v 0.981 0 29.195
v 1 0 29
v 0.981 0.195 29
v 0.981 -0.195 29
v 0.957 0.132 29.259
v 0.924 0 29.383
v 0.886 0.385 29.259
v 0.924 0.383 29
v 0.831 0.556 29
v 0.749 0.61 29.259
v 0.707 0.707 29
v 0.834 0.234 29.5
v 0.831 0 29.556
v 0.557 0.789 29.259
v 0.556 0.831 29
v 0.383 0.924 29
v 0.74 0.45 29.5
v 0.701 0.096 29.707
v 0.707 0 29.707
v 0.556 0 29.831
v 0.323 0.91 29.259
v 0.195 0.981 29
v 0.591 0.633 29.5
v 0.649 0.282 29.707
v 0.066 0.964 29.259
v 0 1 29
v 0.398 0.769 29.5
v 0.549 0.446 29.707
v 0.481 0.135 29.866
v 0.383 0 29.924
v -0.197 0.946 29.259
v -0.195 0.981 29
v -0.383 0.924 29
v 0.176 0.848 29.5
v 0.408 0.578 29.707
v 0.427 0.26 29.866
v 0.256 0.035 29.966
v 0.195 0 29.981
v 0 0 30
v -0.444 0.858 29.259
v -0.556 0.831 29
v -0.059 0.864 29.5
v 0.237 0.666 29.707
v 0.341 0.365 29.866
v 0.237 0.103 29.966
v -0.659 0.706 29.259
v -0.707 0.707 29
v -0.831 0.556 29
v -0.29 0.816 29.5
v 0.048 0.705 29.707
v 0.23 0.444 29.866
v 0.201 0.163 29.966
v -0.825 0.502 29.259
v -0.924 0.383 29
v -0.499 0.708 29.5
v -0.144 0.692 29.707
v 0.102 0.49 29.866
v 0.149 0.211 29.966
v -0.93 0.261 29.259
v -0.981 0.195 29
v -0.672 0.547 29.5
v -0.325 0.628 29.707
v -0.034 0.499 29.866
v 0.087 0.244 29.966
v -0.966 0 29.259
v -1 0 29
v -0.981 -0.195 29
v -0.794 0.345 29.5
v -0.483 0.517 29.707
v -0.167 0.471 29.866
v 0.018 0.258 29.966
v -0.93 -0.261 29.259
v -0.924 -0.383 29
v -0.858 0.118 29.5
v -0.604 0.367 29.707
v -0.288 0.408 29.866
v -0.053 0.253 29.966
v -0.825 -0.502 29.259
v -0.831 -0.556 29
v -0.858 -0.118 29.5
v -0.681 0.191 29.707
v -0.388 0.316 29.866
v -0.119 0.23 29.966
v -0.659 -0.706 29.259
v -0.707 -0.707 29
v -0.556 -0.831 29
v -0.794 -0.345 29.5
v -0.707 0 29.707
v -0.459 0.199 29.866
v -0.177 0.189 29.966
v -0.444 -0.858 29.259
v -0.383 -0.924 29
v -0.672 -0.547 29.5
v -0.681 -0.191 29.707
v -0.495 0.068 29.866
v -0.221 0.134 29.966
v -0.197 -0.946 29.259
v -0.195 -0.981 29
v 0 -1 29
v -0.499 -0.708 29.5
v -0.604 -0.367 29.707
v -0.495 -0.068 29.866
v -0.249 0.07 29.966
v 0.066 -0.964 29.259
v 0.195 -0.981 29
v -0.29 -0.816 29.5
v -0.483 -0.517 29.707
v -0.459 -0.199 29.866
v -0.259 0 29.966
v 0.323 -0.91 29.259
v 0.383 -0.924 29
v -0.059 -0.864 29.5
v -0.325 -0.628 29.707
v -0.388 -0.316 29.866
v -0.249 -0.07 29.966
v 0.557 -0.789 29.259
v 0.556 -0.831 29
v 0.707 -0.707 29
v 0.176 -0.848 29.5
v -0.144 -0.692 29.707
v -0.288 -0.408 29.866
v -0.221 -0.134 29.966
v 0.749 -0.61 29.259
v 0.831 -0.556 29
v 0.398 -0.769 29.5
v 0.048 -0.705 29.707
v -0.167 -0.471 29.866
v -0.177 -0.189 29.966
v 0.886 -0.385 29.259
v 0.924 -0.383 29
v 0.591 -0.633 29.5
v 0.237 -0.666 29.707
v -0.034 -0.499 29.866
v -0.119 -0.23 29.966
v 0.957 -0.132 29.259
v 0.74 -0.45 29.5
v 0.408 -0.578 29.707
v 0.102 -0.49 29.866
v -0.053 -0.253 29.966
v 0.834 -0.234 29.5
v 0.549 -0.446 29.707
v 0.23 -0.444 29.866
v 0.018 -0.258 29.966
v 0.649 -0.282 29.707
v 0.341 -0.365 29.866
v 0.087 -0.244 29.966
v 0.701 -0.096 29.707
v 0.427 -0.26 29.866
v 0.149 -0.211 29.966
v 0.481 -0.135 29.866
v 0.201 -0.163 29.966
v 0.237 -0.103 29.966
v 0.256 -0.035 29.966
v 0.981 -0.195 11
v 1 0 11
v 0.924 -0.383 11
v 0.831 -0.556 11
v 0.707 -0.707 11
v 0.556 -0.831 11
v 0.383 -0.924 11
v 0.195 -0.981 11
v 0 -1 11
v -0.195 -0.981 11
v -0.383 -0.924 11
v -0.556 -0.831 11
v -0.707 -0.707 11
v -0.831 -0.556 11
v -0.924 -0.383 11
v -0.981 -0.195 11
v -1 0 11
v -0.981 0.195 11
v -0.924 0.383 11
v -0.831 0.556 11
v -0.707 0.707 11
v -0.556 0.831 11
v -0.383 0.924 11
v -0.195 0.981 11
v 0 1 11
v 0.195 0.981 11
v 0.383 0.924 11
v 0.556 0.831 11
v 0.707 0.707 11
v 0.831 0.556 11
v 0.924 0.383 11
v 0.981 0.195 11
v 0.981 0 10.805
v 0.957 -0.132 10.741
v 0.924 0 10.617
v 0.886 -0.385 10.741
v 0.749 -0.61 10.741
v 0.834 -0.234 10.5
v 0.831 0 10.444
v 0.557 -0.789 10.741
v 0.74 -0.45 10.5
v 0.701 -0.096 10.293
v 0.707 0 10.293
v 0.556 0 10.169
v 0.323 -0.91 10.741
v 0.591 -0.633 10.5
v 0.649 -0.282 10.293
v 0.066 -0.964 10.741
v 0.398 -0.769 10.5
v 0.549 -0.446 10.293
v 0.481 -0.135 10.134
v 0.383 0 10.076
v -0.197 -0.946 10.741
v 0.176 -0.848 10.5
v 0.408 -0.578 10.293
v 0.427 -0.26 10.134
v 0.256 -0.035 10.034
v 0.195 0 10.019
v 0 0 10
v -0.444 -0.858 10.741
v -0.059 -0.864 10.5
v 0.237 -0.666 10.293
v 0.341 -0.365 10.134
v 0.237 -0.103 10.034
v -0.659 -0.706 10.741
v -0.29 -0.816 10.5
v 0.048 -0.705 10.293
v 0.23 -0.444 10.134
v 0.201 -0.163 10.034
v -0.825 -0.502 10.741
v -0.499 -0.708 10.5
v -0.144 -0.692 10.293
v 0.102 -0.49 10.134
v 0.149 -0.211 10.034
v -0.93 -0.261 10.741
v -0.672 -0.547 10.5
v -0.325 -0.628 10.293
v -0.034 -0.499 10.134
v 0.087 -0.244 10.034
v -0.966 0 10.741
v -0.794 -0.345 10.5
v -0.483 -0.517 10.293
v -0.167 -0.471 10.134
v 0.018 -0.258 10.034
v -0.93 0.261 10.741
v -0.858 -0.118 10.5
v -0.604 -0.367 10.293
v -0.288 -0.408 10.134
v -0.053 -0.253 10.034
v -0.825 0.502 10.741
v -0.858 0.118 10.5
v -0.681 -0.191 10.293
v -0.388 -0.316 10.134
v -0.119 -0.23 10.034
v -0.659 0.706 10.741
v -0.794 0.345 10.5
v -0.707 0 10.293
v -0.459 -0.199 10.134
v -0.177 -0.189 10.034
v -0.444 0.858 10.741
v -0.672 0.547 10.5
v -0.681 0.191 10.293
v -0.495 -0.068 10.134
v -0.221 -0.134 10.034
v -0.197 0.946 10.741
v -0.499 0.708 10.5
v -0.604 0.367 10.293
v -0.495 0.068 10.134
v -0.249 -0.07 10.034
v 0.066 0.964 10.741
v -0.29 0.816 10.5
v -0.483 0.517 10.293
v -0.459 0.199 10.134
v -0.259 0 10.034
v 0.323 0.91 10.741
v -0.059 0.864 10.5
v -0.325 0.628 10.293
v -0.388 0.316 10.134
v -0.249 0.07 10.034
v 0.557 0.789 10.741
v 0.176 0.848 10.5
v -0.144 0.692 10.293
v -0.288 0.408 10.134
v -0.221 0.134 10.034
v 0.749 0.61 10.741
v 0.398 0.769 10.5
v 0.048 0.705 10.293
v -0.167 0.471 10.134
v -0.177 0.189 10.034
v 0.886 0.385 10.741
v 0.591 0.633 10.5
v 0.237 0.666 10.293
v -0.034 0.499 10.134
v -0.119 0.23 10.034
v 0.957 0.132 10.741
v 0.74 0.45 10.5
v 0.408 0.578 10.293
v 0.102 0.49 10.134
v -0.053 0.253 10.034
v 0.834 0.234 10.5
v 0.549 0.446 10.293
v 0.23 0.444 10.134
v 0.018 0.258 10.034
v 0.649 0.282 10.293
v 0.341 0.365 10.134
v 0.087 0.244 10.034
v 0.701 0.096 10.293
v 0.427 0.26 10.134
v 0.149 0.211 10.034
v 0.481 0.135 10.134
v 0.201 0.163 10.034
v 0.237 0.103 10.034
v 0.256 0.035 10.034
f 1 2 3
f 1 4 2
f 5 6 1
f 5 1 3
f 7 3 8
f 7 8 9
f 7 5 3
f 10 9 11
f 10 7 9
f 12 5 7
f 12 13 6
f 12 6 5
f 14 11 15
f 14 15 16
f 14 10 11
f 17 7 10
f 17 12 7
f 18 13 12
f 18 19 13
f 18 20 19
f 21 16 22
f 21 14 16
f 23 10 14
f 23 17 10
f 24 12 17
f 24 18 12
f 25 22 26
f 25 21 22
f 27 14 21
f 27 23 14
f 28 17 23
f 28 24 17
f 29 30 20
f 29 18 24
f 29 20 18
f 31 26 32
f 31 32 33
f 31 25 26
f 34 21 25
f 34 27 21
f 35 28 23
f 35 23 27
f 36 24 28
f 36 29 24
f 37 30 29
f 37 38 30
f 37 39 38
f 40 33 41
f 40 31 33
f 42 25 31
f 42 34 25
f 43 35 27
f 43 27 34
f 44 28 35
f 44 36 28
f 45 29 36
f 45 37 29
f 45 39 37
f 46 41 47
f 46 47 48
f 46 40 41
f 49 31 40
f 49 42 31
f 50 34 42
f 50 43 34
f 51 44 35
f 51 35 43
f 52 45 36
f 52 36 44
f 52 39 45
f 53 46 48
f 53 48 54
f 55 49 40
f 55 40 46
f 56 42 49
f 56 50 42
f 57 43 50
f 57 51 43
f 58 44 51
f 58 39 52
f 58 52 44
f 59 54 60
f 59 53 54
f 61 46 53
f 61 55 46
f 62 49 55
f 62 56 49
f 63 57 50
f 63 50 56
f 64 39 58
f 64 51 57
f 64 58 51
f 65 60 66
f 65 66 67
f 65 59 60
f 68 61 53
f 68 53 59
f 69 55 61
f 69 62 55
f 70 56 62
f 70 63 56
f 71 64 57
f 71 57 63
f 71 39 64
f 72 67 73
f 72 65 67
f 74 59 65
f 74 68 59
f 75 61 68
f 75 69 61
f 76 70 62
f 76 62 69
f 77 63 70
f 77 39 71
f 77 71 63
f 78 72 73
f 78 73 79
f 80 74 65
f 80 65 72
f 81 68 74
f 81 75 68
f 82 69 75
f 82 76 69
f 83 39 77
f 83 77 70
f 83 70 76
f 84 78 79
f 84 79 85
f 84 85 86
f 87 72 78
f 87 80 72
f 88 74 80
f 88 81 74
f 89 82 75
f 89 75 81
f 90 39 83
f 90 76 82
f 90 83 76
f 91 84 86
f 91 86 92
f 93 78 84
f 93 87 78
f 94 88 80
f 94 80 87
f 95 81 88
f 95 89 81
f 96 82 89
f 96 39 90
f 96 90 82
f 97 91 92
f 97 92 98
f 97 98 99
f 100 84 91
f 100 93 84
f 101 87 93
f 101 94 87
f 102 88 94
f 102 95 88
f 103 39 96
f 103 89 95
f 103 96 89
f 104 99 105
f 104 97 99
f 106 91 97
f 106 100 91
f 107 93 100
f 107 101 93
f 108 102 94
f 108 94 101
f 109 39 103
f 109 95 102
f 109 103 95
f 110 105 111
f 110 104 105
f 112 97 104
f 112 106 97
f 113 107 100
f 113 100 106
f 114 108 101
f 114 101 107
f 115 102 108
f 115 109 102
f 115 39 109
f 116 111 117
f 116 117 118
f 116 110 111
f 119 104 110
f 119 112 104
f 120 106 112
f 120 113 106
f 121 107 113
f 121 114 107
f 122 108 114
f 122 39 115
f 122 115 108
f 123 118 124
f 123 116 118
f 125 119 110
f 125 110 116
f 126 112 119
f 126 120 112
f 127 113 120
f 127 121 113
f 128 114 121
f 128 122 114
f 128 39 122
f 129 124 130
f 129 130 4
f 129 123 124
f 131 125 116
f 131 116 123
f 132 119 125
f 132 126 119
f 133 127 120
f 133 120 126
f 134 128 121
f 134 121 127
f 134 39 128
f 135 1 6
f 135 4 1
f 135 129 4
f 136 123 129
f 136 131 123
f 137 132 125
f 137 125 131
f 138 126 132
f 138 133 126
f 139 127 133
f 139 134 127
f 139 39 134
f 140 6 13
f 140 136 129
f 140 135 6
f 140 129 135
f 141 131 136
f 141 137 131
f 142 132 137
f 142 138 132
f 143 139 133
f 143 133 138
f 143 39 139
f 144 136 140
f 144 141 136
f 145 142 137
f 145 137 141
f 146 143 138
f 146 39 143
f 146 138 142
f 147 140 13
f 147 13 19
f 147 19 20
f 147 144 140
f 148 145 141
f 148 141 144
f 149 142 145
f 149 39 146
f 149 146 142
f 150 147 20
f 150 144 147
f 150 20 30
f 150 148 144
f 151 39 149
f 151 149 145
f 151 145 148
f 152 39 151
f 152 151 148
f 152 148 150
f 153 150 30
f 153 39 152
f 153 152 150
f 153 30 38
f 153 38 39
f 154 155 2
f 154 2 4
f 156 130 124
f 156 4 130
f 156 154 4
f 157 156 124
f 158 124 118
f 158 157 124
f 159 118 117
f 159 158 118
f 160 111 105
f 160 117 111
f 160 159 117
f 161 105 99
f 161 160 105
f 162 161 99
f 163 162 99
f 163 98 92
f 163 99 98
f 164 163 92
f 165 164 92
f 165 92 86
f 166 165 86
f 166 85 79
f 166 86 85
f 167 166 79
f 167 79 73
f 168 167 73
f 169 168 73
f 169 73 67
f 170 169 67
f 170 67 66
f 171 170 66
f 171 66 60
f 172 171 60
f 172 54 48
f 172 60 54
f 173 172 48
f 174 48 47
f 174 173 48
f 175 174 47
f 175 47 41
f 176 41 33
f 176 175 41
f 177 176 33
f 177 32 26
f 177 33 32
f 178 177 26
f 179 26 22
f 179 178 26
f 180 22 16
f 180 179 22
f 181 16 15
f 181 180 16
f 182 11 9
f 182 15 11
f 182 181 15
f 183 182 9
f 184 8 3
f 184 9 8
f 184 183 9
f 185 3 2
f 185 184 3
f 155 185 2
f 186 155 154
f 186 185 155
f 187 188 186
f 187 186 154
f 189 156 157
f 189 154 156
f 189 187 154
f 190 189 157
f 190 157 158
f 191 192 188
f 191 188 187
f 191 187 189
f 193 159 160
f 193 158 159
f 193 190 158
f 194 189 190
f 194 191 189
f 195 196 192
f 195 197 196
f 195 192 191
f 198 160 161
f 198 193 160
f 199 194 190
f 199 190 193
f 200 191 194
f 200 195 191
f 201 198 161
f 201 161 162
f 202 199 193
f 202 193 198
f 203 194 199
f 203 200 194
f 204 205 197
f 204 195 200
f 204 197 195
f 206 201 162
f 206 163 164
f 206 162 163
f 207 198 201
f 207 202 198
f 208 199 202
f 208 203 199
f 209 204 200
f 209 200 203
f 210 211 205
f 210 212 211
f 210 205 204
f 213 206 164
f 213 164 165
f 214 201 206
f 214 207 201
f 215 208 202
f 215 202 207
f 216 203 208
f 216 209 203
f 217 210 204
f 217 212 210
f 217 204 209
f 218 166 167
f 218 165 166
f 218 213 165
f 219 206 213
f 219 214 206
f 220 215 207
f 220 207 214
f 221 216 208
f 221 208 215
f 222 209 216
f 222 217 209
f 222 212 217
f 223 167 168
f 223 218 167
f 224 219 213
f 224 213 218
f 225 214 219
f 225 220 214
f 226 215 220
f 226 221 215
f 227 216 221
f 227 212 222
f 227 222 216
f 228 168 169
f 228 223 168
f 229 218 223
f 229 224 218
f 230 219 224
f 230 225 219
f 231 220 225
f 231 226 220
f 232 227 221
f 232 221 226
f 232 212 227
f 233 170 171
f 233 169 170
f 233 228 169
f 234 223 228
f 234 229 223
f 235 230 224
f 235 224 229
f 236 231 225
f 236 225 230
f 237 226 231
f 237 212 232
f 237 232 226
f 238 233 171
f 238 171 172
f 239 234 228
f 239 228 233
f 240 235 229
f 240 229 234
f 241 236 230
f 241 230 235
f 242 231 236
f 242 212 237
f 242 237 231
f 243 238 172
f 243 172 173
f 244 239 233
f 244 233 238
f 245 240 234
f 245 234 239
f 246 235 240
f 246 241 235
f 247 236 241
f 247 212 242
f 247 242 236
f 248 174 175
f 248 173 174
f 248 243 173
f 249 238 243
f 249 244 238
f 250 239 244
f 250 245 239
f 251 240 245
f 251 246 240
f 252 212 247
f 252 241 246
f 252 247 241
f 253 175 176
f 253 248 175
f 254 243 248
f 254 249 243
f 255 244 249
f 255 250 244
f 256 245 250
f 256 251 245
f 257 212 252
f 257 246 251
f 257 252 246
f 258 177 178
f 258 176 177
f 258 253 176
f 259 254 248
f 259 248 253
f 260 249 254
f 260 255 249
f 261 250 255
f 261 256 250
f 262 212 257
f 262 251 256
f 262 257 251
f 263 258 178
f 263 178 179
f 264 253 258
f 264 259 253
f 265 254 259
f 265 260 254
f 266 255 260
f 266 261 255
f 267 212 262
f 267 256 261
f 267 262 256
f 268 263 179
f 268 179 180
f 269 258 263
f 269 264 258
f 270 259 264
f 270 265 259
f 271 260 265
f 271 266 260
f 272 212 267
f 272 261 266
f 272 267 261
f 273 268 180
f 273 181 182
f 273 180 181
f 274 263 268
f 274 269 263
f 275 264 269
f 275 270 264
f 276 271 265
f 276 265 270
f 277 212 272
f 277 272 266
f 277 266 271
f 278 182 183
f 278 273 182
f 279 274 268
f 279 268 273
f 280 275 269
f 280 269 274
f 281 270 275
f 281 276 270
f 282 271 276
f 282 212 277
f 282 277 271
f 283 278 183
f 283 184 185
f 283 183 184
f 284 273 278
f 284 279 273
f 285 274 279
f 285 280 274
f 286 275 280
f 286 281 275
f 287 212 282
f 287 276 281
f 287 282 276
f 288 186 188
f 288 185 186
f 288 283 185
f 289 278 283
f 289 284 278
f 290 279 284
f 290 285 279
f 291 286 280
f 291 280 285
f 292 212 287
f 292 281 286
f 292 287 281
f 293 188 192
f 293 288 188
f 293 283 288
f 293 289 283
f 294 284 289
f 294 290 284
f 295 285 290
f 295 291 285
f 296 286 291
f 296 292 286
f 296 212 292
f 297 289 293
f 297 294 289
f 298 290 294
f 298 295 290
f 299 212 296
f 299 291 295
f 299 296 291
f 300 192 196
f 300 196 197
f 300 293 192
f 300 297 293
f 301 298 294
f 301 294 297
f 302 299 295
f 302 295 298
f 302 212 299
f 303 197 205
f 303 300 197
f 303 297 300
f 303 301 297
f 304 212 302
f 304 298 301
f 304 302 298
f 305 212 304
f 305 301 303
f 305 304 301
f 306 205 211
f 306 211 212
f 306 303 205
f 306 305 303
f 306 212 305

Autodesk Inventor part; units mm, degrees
ref_plane "YZ Plane" through (0, 0, 0) normal (1, 0, 0) x (0, 1, 0)
ref_plane "XZ Plane" through (0, 0, 0) normal (0, 1, 0) x (-1, 0, 0)
ref_plane "XY Plane" through (0, 0, 0) normal (0, 0, 1) x (1, 0, 0)
sketch "Sketch1" plane through (0, 0, 0) normal (0, 0, 1) x (1, 0, 0)
  circle A0 centre (0, 0) radius 2
  dimension "d6" = 4
extrude "Extrusion2" add sketch "Sketch1" along normal blind 40
fillet "Fillet4" radius 2 2 edges at (-2, 0, 0) (-2, 0, 40)
scale "Scale1" factors (0.5, 0.5, 0.5) then translate (0, 0, 10) bodies 1
properties part number "Pasador"
